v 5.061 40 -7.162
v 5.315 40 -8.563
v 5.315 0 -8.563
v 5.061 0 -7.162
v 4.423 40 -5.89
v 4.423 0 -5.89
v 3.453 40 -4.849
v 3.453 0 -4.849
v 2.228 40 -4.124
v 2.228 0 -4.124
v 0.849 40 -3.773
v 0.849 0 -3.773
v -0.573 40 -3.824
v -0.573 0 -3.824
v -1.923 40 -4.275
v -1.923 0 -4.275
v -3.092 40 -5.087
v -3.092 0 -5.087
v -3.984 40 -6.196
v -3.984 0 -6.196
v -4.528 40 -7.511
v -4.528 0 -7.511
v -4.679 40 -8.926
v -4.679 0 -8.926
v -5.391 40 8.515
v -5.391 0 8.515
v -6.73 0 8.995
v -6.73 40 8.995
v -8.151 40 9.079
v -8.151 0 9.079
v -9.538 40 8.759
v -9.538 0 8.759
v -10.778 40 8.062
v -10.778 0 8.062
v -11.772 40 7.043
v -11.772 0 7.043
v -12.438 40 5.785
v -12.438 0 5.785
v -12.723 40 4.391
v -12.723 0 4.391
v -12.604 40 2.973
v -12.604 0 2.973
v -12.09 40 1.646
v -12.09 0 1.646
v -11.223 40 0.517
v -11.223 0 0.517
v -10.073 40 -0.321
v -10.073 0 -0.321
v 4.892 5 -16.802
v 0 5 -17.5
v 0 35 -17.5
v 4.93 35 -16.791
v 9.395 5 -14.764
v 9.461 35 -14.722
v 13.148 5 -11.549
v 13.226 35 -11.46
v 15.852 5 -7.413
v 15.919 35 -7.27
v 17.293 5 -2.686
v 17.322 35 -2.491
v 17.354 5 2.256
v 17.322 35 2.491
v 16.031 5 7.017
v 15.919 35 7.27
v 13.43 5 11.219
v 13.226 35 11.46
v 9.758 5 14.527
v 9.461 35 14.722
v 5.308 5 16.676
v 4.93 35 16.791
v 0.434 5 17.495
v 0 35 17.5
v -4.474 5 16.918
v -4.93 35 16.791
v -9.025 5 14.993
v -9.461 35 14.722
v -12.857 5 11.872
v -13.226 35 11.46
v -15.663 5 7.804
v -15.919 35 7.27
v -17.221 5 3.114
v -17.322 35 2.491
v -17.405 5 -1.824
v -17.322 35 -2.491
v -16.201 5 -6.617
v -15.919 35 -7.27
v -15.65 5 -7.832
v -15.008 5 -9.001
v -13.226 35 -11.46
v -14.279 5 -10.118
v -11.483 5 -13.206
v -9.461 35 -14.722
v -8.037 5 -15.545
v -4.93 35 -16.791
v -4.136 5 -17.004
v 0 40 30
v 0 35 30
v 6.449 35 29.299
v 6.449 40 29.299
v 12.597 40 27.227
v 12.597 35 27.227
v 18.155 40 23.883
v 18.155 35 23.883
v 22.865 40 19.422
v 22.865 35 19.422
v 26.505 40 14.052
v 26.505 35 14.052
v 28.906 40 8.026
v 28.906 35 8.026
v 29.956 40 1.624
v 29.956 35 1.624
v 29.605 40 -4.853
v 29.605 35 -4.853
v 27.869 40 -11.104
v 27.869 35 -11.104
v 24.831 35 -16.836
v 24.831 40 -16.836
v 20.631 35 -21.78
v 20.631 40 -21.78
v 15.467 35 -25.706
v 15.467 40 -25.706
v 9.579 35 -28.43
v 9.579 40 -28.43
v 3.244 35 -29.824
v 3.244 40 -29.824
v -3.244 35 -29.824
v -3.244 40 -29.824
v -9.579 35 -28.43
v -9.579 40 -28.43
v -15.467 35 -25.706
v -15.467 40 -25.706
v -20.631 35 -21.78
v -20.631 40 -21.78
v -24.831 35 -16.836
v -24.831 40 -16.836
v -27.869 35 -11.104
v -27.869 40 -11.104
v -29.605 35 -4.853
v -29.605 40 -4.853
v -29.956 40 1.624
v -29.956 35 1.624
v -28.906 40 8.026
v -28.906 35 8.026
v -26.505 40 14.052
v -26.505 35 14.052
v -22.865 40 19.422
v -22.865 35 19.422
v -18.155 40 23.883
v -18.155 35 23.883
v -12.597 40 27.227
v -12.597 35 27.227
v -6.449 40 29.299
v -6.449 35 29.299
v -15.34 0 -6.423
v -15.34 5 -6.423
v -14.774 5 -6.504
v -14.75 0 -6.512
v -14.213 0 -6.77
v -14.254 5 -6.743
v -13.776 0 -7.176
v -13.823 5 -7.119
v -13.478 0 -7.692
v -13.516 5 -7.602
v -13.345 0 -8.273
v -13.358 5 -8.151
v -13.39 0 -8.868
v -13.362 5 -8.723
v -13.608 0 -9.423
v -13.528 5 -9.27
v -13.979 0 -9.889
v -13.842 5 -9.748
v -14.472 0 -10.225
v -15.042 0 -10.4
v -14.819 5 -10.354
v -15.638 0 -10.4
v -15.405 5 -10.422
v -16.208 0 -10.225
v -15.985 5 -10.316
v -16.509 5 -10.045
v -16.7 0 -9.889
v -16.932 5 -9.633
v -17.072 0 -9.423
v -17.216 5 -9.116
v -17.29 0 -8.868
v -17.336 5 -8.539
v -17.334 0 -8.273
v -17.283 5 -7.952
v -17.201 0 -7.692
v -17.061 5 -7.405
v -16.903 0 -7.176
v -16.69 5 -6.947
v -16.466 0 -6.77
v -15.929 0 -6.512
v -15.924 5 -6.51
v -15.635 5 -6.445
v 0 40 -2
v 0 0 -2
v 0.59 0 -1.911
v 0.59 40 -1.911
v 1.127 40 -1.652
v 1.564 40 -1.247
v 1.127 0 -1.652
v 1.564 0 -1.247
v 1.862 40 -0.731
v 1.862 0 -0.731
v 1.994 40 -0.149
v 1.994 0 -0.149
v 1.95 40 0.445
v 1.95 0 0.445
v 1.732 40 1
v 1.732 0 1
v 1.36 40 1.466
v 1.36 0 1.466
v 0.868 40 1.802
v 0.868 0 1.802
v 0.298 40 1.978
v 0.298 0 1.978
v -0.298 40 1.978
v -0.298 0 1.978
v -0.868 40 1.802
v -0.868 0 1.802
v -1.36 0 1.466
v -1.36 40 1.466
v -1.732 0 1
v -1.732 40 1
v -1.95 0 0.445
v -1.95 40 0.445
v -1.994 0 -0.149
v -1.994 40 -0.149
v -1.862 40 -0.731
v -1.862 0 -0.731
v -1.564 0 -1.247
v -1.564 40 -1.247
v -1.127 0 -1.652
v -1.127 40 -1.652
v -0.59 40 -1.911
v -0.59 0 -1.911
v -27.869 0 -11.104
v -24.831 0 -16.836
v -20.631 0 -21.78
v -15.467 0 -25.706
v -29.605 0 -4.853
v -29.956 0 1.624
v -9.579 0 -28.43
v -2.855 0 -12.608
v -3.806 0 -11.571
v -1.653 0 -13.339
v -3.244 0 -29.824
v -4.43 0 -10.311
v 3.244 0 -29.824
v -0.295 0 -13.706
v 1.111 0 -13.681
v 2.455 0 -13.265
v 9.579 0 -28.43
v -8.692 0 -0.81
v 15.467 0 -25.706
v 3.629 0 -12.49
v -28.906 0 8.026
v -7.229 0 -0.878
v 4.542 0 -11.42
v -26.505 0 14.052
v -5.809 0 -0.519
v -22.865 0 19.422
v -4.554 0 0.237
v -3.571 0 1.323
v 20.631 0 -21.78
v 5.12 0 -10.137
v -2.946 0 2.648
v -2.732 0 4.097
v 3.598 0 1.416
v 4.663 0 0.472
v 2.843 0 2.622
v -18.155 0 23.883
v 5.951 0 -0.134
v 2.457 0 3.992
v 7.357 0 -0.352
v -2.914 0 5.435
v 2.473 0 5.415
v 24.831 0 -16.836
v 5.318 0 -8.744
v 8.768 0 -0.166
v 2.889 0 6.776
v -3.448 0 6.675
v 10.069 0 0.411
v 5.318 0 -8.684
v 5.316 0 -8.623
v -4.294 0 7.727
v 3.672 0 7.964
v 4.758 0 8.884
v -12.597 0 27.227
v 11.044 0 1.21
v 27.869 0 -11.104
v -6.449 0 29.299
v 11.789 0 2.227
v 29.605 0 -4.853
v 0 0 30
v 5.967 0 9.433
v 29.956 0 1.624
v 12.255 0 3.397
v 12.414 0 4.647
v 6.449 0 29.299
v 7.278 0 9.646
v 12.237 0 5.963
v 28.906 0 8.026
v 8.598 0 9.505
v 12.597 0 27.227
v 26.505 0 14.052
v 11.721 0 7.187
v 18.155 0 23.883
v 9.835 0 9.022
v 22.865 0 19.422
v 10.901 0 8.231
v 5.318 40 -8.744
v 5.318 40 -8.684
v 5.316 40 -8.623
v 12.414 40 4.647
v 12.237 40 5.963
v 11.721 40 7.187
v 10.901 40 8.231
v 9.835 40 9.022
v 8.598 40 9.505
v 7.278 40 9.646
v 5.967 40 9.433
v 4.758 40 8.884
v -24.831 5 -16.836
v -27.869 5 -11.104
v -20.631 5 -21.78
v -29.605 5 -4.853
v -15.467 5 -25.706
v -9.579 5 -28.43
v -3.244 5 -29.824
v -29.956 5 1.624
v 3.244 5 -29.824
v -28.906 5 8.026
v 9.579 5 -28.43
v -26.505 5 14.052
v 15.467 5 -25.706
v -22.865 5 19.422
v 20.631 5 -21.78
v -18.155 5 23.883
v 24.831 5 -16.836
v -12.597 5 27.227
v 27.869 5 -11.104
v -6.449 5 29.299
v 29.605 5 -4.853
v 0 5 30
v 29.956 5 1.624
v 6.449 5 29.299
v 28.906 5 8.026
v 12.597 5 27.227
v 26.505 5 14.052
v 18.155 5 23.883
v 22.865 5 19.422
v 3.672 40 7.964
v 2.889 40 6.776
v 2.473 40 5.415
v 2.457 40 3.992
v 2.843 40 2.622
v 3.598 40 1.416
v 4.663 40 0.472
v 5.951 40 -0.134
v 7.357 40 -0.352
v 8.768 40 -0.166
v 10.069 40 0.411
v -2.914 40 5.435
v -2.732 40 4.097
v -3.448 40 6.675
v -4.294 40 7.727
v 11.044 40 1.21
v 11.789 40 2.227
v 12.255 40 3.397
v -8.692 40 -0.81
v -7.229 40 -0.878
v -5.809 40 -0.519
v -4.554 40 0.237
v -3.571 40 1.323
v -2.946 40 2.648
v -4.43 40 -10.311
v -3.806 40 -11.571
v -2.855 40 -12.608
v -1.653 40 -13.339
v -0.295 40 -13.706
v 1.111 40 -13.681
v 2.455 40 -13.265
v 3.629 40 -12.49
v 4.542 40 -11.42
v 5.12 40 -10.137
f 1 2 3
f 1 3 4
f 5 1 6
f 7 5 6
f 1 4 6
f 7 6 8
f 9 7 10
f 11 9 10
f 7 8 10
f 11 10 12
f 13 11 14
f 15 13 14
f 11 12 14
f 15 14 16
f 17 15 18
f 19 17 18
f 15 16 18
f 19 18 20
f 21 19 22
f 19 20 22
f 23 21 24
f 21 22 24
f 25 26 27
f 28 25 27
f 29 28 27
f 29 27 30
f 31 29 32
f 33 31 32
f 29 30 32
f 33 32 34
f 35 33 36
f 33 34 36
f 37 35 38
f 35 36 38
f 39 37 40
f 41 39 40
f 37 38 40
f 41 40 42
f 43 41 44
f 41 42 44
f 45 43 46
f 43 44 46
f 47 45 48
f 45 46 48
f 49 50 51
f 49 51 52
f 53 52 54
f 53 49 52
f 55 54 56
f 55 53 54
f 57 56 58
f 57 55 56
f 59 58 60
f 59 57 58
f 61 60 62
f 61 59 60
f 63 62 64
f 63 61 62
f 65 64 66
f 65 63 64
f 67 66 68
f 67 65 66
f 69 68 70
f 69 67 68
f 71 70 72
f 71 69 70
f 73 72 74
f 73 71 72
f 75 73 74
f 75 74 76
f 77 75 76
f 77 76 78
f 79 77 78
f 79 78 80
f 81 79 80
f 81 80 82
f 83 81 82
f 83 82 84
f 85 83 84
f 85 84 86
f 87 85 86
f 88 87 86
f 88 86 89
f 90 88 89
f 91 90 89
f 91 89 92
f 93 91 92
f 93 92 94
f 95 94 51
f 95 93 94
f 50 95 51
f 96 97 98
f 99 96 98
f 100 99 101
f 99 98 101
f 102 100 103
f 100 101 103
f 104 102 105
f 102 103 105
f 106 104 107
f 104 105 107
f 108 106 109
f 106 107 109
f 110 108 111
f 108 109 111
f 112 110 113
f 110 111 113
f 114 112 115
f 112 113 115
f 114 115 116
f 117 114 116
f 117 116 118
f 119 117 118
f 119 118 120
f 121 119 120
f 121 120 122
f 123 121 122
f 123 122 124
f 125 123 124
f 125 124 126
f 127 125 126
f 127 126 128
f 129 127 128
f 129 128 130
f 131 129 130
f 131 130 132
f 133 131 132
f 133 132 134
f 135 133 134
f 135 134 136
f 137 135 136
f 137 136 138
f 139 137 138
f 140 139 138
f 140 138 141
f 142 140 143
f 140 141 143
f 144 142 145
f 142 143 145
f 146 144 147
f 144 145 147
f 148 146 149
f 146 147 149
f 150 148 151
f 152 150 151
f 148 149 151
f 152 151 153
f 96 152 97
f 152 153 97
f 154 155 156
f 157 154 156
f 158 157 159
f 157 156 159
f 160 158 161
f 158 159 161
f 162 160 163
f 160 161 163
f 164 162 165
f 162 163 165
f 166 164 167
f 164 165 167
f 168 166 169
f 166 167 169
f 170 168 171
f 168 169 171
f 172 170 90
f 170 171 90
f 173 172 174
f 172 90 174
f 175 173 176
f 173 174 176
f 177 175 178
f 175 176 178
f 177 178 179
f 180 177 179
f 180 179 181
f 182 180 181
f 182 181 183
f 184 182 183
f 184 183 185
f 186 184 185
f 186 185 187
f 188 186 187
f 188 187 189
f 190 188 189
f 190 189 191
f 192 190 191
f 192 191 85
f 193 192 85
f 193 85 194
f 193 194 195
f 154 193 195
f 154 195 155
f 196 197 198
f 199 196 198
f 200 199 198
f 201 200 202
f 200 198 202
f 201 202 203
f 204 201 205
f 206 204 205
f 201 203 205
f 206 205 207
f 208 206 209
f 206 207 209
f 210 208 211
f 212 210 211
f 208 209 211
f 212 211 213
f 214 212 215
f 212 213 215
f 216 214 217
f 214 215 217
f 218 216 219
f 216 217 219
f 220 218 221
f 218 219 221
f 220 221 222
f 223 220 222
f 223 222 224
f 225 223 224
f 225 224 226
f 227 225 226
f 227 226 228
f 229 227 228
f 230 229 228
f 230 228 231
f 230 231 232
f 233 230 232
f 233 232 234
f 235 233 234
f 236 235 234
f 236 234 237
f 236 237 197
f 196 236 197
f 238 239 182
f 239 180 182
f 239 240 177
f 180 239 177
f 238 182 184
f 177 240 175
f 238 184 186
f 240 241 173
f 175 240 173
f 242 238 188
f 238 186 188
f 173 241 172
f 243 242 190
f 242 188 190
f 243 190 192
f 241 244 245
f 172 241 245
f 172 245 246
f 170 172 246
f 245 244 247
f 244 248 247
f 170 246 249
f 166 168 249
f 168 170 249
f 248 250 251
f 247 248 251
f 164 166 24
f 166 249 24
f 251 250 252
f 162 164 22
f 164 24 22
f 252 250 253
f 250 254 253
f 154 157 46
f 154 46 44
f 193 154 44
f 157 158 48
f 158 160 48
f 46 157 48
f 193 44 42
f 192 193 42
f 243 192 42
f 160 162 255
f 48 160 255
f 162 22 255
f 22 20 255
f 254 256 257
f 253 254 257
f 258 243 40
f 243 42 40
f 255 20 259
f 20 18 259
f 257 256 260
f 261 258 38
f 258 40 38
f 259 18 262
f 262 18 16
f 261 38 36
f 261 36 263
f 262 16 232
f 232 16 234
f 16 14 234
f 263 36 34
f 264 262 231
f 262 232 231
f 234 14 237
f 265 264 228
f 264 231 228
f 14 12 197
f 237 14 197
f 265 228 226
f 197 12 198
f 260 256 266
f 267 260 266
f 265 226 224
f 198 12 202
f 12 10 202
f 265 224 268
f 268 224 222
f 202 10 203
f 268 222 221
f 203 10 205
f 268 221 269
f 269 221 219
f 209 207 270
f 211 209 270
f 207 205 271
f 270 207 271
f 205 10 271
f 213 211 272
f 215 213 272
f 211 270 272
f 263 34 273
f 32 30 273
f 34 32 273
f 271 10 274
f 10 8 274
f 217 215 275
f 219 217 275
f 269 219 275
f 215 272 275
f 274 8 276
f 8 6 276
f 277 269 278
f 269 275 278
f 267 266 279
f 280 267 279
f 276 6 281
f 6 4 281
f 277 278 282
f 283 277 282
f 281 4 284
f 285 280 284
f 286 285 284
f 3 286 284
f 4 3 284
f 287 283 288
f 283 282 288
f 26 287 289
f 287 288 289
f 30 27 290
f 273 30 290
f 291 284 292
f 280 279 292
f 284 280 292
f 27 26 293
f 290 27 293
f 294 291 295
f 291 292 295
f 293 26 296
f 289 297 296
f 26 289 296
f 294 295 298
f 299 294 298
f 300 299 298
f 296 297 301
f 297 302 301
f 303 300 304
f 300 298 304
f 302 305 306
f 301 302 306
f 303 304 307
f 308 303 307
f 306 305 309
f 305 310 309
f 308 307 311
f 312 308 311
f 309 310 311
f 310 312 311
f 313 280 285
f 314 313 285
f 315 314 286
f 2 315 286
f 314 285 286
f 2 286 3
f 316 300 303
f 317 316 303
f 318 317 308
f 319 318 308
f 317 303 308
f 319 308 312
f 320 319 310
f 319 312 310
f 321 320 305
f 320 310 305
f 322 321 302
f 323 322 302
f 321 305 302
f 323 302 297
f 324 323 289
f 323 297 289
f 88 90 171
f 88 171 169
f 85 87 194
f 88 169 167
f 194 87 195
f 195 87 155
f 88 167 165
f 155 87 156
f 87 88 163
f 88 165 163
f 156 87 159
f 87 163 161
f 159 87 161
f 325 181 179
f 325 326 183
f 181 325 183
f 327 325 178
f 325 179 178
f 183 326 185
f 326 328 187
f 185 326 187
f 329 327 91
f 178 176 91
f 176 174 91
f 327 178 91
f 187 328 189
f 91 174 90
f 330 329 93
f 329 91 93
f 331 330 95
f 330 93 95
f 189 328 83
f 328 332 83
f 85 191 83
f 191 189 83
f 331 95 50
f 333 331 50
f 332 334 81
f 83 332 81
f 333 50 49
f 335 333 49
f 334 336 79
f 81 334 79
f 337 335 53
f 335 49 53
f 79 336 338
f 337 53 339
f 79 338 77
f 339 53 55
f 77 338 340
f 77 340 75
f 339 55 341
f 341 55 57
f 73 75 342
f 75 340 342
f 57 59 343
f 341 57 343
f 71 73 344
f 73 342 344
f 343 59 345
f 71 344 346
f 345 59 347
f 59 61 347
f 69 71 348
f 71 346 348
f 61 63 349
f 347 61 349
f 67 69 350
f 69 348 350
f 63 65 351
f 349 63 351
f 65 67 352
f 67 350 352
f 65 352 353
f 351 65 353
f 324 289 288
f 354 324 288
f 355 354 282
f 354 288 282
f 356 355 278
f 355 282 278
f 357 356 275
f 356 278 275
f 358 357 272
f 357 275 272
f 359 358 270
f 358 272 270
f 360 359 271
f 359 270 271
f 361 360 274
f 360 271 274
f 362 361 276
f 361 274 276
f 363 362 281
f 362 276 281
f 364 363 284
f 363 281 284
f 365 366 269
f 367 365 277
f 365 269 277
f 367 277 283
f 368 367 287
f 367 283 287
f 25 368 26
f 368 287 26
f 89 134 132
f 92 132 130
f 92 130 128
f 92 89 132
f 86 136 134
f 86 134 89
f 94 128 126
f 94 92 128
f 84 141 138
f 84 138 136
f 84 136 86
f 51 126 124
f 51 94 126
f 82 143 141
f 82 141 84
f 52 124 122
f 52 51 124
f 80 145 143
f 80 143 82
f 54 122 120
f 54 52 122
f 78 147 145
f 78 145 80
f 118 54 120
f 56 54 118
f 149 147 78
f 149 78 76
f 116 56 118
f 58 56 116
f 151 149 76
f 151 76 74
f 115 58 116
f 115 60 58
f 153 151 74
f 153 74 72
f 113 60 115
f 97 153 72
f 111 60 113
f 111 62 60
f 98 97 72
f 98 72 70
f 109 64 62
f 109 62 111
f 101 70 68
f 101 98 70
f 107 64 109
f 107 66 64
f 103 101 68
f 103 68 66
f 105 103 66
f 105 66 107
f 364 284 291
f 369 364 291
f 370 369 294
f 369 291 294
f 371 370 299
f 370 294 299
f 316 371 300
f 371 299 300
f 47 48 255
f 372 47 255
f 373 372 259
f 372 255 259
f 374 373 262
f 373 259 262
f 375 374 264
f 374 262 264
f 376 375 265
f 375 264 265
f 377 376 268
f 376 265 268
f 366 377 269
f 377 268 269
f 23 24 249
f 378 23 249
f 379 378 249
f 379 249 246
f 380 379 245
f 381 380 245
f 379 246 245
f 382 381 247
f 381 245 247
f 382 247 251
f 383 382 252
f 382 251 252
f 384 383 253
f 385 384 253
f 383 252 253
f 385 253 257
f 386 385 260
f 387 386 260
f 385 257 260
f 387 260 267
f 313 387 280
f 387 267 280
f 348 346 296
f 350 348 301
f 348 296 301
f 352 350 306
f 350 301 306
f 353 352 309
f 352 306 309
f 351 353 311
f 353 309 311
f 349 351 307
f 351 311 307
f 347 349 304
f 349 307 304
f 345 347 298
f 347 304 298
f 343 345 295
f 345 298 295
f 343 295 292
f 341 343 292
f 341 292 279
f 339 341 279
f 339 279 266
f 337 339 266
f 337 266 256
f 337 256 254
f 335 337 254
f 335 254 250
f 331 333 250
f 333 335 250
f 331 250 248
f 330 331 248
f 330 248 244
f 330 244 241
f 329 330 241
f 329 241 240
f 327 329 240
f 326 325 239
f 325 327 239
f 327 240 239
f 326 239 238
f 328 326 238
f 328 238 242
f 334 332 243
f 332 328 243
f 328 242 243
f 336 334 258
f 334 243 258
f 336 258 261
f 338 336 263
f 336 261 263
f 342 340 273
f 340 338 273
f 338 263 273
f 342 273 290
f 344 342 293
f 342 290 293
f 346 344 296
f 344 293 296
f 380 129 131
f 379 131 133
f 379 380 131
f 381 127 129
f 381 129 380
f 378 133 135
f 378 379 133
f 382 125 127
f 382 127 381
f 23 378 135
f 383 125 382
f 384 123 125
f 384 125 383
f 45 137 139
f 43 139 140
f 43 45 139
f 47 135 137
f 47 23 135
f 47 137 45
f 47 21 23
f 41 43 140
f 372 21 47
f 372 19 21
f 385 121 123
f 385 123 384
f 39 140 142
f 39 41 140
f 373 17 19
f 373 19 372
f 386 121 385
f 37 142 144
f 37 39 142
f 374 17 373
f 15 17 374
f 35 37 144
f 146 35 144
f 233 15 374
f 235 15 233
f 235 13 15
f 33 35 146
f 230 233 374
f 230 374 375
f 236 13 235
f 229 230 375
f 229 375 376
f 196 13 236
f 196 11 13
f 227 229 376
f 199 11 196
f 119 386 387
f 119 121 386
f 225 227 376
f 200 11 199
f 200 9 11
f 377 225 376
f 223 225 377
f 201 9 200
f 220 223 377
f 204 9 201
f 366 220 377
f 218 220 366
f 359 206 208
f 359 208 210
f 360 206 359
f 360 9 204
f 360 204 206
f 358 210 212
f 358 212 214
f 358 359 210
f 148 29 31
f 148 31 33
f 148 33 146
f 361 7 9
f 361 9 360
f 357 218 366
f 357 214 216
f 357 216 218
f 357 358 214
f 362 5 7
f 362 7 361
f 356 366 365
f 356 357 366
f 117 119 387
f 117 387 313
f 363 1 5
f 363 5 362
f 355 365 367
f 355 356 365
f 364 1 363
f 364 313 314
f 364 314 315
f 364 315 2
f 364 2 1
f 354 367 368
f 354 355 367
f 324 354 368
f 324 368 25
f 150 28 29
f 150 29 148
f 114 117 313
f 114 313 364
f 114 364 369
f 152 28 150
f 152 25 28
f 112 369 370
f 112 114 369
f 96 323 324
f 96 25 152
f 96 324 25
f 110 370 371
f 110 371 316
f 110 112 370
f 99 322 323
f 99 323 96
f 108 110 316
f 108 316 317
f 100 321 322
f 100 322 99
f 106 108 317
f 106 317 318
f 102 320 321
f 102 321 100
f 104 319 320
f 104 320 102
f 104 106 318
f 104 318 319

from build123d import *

# Parameters (mm, degrees)
SKETCH1_R           = 30
BOSS_EXTRUDE1_DEPTH = 40
CUT_EXTRUDE1_START  = -5
SKETCH2_OUTSIDE_W   = 80.762
SKETCH2_OUTSIDE_H   = 80.762
SKETCH2_OUTSIDE_R   = 17.5
CUT_EXTRUDE1_DEPTH  = 30
SKETCH3_R           = 2
CUT_EXTRUDE2_DEPTH  = 59.309518948
SKETCH4_R           = 5
CUT_EXTRUDE3_DEPTH  = 59.309518948
CUT_EXTRUDE4_REACH  = 57
SKETCH5_R           = 2


with BuildPart() as part:
    # Sketch1 → Boss-Extrude1 (new body)
    with BuildSketch(Plane(origin=(0, 0, 0), x_dir=(1, 0, 0), z_dir=(0, 1, 0))):
        Circle(SKETCH1_R)
    extrude(amount=BOSS_EXTRUDE1_DEPTH)

    # Sketch2 outside → Cut-Extrude1 (cut)
    with BuildSketch(Plane.XZ.offset(CUT_EXTRUDE1_START)):
        Rectangle(SKETCH2_OUTSIDE_W, SKETCH2_OUTSIDE_H)
        Circle(SKETCH2_OUTSIDE_R, mode=Mode.SUBTRACT)
    extrude(amount=-CUT_EXTRUDE1_DEPTH, mode=Mode.SUBTRACT)

    # Sketch3 → Cut-Extrude2 (cut, through all)
    with BuildSketch(Plane.XZ):
        Circle(SKETCH3_R)
    extrude(amount=-CUT_EXTRUDE2_DEPTH, mode=Mode.SUBTRACT)

    # Sketch4 → Cut-Extrude3 (cut, through all)
    with BuildSketch(Plane.XZ):
        with Locations((0.317902702, -8.744223114)):
            Circle(SKETCH4_R)
        with Locations((-7.731670704, 4.096799742)):
            Circle(SKETCH4_R)
        with Locations((7.413768003, 4.647423373)):
            Circle(SKETCH4_R)
    extrude(amount=-CUT_EXTRUDE3_DEPTH, mode=Mode.SUBTRACT)

    # Sketch5 → Cut-Extrude4 (cut, up to next)
    with BuildSketch(Plane(origin=(0, 5, 0), x_dir=(1, 0, 0), z_dir=(0, 1, 0)), mode=Mode.PRIVATE) as cut_extrude4_sk1:
        with Locations((-15.339737127, 8.422734999)):
            Circle(SKETCH5_R)
    cut_extrude4_tool1 = extrude(cut_extrude4_sk1.sketch, amount=-CUT_EXTRUDE4_REACH, mode=Mode.PRIVATE) & part.part
    add(cut_extrude4_tool1.solids().sort_by_distance((-15.339737, 5, -8.422735))[0], mode=Mode.SUBTRACT)


solid = part.part
